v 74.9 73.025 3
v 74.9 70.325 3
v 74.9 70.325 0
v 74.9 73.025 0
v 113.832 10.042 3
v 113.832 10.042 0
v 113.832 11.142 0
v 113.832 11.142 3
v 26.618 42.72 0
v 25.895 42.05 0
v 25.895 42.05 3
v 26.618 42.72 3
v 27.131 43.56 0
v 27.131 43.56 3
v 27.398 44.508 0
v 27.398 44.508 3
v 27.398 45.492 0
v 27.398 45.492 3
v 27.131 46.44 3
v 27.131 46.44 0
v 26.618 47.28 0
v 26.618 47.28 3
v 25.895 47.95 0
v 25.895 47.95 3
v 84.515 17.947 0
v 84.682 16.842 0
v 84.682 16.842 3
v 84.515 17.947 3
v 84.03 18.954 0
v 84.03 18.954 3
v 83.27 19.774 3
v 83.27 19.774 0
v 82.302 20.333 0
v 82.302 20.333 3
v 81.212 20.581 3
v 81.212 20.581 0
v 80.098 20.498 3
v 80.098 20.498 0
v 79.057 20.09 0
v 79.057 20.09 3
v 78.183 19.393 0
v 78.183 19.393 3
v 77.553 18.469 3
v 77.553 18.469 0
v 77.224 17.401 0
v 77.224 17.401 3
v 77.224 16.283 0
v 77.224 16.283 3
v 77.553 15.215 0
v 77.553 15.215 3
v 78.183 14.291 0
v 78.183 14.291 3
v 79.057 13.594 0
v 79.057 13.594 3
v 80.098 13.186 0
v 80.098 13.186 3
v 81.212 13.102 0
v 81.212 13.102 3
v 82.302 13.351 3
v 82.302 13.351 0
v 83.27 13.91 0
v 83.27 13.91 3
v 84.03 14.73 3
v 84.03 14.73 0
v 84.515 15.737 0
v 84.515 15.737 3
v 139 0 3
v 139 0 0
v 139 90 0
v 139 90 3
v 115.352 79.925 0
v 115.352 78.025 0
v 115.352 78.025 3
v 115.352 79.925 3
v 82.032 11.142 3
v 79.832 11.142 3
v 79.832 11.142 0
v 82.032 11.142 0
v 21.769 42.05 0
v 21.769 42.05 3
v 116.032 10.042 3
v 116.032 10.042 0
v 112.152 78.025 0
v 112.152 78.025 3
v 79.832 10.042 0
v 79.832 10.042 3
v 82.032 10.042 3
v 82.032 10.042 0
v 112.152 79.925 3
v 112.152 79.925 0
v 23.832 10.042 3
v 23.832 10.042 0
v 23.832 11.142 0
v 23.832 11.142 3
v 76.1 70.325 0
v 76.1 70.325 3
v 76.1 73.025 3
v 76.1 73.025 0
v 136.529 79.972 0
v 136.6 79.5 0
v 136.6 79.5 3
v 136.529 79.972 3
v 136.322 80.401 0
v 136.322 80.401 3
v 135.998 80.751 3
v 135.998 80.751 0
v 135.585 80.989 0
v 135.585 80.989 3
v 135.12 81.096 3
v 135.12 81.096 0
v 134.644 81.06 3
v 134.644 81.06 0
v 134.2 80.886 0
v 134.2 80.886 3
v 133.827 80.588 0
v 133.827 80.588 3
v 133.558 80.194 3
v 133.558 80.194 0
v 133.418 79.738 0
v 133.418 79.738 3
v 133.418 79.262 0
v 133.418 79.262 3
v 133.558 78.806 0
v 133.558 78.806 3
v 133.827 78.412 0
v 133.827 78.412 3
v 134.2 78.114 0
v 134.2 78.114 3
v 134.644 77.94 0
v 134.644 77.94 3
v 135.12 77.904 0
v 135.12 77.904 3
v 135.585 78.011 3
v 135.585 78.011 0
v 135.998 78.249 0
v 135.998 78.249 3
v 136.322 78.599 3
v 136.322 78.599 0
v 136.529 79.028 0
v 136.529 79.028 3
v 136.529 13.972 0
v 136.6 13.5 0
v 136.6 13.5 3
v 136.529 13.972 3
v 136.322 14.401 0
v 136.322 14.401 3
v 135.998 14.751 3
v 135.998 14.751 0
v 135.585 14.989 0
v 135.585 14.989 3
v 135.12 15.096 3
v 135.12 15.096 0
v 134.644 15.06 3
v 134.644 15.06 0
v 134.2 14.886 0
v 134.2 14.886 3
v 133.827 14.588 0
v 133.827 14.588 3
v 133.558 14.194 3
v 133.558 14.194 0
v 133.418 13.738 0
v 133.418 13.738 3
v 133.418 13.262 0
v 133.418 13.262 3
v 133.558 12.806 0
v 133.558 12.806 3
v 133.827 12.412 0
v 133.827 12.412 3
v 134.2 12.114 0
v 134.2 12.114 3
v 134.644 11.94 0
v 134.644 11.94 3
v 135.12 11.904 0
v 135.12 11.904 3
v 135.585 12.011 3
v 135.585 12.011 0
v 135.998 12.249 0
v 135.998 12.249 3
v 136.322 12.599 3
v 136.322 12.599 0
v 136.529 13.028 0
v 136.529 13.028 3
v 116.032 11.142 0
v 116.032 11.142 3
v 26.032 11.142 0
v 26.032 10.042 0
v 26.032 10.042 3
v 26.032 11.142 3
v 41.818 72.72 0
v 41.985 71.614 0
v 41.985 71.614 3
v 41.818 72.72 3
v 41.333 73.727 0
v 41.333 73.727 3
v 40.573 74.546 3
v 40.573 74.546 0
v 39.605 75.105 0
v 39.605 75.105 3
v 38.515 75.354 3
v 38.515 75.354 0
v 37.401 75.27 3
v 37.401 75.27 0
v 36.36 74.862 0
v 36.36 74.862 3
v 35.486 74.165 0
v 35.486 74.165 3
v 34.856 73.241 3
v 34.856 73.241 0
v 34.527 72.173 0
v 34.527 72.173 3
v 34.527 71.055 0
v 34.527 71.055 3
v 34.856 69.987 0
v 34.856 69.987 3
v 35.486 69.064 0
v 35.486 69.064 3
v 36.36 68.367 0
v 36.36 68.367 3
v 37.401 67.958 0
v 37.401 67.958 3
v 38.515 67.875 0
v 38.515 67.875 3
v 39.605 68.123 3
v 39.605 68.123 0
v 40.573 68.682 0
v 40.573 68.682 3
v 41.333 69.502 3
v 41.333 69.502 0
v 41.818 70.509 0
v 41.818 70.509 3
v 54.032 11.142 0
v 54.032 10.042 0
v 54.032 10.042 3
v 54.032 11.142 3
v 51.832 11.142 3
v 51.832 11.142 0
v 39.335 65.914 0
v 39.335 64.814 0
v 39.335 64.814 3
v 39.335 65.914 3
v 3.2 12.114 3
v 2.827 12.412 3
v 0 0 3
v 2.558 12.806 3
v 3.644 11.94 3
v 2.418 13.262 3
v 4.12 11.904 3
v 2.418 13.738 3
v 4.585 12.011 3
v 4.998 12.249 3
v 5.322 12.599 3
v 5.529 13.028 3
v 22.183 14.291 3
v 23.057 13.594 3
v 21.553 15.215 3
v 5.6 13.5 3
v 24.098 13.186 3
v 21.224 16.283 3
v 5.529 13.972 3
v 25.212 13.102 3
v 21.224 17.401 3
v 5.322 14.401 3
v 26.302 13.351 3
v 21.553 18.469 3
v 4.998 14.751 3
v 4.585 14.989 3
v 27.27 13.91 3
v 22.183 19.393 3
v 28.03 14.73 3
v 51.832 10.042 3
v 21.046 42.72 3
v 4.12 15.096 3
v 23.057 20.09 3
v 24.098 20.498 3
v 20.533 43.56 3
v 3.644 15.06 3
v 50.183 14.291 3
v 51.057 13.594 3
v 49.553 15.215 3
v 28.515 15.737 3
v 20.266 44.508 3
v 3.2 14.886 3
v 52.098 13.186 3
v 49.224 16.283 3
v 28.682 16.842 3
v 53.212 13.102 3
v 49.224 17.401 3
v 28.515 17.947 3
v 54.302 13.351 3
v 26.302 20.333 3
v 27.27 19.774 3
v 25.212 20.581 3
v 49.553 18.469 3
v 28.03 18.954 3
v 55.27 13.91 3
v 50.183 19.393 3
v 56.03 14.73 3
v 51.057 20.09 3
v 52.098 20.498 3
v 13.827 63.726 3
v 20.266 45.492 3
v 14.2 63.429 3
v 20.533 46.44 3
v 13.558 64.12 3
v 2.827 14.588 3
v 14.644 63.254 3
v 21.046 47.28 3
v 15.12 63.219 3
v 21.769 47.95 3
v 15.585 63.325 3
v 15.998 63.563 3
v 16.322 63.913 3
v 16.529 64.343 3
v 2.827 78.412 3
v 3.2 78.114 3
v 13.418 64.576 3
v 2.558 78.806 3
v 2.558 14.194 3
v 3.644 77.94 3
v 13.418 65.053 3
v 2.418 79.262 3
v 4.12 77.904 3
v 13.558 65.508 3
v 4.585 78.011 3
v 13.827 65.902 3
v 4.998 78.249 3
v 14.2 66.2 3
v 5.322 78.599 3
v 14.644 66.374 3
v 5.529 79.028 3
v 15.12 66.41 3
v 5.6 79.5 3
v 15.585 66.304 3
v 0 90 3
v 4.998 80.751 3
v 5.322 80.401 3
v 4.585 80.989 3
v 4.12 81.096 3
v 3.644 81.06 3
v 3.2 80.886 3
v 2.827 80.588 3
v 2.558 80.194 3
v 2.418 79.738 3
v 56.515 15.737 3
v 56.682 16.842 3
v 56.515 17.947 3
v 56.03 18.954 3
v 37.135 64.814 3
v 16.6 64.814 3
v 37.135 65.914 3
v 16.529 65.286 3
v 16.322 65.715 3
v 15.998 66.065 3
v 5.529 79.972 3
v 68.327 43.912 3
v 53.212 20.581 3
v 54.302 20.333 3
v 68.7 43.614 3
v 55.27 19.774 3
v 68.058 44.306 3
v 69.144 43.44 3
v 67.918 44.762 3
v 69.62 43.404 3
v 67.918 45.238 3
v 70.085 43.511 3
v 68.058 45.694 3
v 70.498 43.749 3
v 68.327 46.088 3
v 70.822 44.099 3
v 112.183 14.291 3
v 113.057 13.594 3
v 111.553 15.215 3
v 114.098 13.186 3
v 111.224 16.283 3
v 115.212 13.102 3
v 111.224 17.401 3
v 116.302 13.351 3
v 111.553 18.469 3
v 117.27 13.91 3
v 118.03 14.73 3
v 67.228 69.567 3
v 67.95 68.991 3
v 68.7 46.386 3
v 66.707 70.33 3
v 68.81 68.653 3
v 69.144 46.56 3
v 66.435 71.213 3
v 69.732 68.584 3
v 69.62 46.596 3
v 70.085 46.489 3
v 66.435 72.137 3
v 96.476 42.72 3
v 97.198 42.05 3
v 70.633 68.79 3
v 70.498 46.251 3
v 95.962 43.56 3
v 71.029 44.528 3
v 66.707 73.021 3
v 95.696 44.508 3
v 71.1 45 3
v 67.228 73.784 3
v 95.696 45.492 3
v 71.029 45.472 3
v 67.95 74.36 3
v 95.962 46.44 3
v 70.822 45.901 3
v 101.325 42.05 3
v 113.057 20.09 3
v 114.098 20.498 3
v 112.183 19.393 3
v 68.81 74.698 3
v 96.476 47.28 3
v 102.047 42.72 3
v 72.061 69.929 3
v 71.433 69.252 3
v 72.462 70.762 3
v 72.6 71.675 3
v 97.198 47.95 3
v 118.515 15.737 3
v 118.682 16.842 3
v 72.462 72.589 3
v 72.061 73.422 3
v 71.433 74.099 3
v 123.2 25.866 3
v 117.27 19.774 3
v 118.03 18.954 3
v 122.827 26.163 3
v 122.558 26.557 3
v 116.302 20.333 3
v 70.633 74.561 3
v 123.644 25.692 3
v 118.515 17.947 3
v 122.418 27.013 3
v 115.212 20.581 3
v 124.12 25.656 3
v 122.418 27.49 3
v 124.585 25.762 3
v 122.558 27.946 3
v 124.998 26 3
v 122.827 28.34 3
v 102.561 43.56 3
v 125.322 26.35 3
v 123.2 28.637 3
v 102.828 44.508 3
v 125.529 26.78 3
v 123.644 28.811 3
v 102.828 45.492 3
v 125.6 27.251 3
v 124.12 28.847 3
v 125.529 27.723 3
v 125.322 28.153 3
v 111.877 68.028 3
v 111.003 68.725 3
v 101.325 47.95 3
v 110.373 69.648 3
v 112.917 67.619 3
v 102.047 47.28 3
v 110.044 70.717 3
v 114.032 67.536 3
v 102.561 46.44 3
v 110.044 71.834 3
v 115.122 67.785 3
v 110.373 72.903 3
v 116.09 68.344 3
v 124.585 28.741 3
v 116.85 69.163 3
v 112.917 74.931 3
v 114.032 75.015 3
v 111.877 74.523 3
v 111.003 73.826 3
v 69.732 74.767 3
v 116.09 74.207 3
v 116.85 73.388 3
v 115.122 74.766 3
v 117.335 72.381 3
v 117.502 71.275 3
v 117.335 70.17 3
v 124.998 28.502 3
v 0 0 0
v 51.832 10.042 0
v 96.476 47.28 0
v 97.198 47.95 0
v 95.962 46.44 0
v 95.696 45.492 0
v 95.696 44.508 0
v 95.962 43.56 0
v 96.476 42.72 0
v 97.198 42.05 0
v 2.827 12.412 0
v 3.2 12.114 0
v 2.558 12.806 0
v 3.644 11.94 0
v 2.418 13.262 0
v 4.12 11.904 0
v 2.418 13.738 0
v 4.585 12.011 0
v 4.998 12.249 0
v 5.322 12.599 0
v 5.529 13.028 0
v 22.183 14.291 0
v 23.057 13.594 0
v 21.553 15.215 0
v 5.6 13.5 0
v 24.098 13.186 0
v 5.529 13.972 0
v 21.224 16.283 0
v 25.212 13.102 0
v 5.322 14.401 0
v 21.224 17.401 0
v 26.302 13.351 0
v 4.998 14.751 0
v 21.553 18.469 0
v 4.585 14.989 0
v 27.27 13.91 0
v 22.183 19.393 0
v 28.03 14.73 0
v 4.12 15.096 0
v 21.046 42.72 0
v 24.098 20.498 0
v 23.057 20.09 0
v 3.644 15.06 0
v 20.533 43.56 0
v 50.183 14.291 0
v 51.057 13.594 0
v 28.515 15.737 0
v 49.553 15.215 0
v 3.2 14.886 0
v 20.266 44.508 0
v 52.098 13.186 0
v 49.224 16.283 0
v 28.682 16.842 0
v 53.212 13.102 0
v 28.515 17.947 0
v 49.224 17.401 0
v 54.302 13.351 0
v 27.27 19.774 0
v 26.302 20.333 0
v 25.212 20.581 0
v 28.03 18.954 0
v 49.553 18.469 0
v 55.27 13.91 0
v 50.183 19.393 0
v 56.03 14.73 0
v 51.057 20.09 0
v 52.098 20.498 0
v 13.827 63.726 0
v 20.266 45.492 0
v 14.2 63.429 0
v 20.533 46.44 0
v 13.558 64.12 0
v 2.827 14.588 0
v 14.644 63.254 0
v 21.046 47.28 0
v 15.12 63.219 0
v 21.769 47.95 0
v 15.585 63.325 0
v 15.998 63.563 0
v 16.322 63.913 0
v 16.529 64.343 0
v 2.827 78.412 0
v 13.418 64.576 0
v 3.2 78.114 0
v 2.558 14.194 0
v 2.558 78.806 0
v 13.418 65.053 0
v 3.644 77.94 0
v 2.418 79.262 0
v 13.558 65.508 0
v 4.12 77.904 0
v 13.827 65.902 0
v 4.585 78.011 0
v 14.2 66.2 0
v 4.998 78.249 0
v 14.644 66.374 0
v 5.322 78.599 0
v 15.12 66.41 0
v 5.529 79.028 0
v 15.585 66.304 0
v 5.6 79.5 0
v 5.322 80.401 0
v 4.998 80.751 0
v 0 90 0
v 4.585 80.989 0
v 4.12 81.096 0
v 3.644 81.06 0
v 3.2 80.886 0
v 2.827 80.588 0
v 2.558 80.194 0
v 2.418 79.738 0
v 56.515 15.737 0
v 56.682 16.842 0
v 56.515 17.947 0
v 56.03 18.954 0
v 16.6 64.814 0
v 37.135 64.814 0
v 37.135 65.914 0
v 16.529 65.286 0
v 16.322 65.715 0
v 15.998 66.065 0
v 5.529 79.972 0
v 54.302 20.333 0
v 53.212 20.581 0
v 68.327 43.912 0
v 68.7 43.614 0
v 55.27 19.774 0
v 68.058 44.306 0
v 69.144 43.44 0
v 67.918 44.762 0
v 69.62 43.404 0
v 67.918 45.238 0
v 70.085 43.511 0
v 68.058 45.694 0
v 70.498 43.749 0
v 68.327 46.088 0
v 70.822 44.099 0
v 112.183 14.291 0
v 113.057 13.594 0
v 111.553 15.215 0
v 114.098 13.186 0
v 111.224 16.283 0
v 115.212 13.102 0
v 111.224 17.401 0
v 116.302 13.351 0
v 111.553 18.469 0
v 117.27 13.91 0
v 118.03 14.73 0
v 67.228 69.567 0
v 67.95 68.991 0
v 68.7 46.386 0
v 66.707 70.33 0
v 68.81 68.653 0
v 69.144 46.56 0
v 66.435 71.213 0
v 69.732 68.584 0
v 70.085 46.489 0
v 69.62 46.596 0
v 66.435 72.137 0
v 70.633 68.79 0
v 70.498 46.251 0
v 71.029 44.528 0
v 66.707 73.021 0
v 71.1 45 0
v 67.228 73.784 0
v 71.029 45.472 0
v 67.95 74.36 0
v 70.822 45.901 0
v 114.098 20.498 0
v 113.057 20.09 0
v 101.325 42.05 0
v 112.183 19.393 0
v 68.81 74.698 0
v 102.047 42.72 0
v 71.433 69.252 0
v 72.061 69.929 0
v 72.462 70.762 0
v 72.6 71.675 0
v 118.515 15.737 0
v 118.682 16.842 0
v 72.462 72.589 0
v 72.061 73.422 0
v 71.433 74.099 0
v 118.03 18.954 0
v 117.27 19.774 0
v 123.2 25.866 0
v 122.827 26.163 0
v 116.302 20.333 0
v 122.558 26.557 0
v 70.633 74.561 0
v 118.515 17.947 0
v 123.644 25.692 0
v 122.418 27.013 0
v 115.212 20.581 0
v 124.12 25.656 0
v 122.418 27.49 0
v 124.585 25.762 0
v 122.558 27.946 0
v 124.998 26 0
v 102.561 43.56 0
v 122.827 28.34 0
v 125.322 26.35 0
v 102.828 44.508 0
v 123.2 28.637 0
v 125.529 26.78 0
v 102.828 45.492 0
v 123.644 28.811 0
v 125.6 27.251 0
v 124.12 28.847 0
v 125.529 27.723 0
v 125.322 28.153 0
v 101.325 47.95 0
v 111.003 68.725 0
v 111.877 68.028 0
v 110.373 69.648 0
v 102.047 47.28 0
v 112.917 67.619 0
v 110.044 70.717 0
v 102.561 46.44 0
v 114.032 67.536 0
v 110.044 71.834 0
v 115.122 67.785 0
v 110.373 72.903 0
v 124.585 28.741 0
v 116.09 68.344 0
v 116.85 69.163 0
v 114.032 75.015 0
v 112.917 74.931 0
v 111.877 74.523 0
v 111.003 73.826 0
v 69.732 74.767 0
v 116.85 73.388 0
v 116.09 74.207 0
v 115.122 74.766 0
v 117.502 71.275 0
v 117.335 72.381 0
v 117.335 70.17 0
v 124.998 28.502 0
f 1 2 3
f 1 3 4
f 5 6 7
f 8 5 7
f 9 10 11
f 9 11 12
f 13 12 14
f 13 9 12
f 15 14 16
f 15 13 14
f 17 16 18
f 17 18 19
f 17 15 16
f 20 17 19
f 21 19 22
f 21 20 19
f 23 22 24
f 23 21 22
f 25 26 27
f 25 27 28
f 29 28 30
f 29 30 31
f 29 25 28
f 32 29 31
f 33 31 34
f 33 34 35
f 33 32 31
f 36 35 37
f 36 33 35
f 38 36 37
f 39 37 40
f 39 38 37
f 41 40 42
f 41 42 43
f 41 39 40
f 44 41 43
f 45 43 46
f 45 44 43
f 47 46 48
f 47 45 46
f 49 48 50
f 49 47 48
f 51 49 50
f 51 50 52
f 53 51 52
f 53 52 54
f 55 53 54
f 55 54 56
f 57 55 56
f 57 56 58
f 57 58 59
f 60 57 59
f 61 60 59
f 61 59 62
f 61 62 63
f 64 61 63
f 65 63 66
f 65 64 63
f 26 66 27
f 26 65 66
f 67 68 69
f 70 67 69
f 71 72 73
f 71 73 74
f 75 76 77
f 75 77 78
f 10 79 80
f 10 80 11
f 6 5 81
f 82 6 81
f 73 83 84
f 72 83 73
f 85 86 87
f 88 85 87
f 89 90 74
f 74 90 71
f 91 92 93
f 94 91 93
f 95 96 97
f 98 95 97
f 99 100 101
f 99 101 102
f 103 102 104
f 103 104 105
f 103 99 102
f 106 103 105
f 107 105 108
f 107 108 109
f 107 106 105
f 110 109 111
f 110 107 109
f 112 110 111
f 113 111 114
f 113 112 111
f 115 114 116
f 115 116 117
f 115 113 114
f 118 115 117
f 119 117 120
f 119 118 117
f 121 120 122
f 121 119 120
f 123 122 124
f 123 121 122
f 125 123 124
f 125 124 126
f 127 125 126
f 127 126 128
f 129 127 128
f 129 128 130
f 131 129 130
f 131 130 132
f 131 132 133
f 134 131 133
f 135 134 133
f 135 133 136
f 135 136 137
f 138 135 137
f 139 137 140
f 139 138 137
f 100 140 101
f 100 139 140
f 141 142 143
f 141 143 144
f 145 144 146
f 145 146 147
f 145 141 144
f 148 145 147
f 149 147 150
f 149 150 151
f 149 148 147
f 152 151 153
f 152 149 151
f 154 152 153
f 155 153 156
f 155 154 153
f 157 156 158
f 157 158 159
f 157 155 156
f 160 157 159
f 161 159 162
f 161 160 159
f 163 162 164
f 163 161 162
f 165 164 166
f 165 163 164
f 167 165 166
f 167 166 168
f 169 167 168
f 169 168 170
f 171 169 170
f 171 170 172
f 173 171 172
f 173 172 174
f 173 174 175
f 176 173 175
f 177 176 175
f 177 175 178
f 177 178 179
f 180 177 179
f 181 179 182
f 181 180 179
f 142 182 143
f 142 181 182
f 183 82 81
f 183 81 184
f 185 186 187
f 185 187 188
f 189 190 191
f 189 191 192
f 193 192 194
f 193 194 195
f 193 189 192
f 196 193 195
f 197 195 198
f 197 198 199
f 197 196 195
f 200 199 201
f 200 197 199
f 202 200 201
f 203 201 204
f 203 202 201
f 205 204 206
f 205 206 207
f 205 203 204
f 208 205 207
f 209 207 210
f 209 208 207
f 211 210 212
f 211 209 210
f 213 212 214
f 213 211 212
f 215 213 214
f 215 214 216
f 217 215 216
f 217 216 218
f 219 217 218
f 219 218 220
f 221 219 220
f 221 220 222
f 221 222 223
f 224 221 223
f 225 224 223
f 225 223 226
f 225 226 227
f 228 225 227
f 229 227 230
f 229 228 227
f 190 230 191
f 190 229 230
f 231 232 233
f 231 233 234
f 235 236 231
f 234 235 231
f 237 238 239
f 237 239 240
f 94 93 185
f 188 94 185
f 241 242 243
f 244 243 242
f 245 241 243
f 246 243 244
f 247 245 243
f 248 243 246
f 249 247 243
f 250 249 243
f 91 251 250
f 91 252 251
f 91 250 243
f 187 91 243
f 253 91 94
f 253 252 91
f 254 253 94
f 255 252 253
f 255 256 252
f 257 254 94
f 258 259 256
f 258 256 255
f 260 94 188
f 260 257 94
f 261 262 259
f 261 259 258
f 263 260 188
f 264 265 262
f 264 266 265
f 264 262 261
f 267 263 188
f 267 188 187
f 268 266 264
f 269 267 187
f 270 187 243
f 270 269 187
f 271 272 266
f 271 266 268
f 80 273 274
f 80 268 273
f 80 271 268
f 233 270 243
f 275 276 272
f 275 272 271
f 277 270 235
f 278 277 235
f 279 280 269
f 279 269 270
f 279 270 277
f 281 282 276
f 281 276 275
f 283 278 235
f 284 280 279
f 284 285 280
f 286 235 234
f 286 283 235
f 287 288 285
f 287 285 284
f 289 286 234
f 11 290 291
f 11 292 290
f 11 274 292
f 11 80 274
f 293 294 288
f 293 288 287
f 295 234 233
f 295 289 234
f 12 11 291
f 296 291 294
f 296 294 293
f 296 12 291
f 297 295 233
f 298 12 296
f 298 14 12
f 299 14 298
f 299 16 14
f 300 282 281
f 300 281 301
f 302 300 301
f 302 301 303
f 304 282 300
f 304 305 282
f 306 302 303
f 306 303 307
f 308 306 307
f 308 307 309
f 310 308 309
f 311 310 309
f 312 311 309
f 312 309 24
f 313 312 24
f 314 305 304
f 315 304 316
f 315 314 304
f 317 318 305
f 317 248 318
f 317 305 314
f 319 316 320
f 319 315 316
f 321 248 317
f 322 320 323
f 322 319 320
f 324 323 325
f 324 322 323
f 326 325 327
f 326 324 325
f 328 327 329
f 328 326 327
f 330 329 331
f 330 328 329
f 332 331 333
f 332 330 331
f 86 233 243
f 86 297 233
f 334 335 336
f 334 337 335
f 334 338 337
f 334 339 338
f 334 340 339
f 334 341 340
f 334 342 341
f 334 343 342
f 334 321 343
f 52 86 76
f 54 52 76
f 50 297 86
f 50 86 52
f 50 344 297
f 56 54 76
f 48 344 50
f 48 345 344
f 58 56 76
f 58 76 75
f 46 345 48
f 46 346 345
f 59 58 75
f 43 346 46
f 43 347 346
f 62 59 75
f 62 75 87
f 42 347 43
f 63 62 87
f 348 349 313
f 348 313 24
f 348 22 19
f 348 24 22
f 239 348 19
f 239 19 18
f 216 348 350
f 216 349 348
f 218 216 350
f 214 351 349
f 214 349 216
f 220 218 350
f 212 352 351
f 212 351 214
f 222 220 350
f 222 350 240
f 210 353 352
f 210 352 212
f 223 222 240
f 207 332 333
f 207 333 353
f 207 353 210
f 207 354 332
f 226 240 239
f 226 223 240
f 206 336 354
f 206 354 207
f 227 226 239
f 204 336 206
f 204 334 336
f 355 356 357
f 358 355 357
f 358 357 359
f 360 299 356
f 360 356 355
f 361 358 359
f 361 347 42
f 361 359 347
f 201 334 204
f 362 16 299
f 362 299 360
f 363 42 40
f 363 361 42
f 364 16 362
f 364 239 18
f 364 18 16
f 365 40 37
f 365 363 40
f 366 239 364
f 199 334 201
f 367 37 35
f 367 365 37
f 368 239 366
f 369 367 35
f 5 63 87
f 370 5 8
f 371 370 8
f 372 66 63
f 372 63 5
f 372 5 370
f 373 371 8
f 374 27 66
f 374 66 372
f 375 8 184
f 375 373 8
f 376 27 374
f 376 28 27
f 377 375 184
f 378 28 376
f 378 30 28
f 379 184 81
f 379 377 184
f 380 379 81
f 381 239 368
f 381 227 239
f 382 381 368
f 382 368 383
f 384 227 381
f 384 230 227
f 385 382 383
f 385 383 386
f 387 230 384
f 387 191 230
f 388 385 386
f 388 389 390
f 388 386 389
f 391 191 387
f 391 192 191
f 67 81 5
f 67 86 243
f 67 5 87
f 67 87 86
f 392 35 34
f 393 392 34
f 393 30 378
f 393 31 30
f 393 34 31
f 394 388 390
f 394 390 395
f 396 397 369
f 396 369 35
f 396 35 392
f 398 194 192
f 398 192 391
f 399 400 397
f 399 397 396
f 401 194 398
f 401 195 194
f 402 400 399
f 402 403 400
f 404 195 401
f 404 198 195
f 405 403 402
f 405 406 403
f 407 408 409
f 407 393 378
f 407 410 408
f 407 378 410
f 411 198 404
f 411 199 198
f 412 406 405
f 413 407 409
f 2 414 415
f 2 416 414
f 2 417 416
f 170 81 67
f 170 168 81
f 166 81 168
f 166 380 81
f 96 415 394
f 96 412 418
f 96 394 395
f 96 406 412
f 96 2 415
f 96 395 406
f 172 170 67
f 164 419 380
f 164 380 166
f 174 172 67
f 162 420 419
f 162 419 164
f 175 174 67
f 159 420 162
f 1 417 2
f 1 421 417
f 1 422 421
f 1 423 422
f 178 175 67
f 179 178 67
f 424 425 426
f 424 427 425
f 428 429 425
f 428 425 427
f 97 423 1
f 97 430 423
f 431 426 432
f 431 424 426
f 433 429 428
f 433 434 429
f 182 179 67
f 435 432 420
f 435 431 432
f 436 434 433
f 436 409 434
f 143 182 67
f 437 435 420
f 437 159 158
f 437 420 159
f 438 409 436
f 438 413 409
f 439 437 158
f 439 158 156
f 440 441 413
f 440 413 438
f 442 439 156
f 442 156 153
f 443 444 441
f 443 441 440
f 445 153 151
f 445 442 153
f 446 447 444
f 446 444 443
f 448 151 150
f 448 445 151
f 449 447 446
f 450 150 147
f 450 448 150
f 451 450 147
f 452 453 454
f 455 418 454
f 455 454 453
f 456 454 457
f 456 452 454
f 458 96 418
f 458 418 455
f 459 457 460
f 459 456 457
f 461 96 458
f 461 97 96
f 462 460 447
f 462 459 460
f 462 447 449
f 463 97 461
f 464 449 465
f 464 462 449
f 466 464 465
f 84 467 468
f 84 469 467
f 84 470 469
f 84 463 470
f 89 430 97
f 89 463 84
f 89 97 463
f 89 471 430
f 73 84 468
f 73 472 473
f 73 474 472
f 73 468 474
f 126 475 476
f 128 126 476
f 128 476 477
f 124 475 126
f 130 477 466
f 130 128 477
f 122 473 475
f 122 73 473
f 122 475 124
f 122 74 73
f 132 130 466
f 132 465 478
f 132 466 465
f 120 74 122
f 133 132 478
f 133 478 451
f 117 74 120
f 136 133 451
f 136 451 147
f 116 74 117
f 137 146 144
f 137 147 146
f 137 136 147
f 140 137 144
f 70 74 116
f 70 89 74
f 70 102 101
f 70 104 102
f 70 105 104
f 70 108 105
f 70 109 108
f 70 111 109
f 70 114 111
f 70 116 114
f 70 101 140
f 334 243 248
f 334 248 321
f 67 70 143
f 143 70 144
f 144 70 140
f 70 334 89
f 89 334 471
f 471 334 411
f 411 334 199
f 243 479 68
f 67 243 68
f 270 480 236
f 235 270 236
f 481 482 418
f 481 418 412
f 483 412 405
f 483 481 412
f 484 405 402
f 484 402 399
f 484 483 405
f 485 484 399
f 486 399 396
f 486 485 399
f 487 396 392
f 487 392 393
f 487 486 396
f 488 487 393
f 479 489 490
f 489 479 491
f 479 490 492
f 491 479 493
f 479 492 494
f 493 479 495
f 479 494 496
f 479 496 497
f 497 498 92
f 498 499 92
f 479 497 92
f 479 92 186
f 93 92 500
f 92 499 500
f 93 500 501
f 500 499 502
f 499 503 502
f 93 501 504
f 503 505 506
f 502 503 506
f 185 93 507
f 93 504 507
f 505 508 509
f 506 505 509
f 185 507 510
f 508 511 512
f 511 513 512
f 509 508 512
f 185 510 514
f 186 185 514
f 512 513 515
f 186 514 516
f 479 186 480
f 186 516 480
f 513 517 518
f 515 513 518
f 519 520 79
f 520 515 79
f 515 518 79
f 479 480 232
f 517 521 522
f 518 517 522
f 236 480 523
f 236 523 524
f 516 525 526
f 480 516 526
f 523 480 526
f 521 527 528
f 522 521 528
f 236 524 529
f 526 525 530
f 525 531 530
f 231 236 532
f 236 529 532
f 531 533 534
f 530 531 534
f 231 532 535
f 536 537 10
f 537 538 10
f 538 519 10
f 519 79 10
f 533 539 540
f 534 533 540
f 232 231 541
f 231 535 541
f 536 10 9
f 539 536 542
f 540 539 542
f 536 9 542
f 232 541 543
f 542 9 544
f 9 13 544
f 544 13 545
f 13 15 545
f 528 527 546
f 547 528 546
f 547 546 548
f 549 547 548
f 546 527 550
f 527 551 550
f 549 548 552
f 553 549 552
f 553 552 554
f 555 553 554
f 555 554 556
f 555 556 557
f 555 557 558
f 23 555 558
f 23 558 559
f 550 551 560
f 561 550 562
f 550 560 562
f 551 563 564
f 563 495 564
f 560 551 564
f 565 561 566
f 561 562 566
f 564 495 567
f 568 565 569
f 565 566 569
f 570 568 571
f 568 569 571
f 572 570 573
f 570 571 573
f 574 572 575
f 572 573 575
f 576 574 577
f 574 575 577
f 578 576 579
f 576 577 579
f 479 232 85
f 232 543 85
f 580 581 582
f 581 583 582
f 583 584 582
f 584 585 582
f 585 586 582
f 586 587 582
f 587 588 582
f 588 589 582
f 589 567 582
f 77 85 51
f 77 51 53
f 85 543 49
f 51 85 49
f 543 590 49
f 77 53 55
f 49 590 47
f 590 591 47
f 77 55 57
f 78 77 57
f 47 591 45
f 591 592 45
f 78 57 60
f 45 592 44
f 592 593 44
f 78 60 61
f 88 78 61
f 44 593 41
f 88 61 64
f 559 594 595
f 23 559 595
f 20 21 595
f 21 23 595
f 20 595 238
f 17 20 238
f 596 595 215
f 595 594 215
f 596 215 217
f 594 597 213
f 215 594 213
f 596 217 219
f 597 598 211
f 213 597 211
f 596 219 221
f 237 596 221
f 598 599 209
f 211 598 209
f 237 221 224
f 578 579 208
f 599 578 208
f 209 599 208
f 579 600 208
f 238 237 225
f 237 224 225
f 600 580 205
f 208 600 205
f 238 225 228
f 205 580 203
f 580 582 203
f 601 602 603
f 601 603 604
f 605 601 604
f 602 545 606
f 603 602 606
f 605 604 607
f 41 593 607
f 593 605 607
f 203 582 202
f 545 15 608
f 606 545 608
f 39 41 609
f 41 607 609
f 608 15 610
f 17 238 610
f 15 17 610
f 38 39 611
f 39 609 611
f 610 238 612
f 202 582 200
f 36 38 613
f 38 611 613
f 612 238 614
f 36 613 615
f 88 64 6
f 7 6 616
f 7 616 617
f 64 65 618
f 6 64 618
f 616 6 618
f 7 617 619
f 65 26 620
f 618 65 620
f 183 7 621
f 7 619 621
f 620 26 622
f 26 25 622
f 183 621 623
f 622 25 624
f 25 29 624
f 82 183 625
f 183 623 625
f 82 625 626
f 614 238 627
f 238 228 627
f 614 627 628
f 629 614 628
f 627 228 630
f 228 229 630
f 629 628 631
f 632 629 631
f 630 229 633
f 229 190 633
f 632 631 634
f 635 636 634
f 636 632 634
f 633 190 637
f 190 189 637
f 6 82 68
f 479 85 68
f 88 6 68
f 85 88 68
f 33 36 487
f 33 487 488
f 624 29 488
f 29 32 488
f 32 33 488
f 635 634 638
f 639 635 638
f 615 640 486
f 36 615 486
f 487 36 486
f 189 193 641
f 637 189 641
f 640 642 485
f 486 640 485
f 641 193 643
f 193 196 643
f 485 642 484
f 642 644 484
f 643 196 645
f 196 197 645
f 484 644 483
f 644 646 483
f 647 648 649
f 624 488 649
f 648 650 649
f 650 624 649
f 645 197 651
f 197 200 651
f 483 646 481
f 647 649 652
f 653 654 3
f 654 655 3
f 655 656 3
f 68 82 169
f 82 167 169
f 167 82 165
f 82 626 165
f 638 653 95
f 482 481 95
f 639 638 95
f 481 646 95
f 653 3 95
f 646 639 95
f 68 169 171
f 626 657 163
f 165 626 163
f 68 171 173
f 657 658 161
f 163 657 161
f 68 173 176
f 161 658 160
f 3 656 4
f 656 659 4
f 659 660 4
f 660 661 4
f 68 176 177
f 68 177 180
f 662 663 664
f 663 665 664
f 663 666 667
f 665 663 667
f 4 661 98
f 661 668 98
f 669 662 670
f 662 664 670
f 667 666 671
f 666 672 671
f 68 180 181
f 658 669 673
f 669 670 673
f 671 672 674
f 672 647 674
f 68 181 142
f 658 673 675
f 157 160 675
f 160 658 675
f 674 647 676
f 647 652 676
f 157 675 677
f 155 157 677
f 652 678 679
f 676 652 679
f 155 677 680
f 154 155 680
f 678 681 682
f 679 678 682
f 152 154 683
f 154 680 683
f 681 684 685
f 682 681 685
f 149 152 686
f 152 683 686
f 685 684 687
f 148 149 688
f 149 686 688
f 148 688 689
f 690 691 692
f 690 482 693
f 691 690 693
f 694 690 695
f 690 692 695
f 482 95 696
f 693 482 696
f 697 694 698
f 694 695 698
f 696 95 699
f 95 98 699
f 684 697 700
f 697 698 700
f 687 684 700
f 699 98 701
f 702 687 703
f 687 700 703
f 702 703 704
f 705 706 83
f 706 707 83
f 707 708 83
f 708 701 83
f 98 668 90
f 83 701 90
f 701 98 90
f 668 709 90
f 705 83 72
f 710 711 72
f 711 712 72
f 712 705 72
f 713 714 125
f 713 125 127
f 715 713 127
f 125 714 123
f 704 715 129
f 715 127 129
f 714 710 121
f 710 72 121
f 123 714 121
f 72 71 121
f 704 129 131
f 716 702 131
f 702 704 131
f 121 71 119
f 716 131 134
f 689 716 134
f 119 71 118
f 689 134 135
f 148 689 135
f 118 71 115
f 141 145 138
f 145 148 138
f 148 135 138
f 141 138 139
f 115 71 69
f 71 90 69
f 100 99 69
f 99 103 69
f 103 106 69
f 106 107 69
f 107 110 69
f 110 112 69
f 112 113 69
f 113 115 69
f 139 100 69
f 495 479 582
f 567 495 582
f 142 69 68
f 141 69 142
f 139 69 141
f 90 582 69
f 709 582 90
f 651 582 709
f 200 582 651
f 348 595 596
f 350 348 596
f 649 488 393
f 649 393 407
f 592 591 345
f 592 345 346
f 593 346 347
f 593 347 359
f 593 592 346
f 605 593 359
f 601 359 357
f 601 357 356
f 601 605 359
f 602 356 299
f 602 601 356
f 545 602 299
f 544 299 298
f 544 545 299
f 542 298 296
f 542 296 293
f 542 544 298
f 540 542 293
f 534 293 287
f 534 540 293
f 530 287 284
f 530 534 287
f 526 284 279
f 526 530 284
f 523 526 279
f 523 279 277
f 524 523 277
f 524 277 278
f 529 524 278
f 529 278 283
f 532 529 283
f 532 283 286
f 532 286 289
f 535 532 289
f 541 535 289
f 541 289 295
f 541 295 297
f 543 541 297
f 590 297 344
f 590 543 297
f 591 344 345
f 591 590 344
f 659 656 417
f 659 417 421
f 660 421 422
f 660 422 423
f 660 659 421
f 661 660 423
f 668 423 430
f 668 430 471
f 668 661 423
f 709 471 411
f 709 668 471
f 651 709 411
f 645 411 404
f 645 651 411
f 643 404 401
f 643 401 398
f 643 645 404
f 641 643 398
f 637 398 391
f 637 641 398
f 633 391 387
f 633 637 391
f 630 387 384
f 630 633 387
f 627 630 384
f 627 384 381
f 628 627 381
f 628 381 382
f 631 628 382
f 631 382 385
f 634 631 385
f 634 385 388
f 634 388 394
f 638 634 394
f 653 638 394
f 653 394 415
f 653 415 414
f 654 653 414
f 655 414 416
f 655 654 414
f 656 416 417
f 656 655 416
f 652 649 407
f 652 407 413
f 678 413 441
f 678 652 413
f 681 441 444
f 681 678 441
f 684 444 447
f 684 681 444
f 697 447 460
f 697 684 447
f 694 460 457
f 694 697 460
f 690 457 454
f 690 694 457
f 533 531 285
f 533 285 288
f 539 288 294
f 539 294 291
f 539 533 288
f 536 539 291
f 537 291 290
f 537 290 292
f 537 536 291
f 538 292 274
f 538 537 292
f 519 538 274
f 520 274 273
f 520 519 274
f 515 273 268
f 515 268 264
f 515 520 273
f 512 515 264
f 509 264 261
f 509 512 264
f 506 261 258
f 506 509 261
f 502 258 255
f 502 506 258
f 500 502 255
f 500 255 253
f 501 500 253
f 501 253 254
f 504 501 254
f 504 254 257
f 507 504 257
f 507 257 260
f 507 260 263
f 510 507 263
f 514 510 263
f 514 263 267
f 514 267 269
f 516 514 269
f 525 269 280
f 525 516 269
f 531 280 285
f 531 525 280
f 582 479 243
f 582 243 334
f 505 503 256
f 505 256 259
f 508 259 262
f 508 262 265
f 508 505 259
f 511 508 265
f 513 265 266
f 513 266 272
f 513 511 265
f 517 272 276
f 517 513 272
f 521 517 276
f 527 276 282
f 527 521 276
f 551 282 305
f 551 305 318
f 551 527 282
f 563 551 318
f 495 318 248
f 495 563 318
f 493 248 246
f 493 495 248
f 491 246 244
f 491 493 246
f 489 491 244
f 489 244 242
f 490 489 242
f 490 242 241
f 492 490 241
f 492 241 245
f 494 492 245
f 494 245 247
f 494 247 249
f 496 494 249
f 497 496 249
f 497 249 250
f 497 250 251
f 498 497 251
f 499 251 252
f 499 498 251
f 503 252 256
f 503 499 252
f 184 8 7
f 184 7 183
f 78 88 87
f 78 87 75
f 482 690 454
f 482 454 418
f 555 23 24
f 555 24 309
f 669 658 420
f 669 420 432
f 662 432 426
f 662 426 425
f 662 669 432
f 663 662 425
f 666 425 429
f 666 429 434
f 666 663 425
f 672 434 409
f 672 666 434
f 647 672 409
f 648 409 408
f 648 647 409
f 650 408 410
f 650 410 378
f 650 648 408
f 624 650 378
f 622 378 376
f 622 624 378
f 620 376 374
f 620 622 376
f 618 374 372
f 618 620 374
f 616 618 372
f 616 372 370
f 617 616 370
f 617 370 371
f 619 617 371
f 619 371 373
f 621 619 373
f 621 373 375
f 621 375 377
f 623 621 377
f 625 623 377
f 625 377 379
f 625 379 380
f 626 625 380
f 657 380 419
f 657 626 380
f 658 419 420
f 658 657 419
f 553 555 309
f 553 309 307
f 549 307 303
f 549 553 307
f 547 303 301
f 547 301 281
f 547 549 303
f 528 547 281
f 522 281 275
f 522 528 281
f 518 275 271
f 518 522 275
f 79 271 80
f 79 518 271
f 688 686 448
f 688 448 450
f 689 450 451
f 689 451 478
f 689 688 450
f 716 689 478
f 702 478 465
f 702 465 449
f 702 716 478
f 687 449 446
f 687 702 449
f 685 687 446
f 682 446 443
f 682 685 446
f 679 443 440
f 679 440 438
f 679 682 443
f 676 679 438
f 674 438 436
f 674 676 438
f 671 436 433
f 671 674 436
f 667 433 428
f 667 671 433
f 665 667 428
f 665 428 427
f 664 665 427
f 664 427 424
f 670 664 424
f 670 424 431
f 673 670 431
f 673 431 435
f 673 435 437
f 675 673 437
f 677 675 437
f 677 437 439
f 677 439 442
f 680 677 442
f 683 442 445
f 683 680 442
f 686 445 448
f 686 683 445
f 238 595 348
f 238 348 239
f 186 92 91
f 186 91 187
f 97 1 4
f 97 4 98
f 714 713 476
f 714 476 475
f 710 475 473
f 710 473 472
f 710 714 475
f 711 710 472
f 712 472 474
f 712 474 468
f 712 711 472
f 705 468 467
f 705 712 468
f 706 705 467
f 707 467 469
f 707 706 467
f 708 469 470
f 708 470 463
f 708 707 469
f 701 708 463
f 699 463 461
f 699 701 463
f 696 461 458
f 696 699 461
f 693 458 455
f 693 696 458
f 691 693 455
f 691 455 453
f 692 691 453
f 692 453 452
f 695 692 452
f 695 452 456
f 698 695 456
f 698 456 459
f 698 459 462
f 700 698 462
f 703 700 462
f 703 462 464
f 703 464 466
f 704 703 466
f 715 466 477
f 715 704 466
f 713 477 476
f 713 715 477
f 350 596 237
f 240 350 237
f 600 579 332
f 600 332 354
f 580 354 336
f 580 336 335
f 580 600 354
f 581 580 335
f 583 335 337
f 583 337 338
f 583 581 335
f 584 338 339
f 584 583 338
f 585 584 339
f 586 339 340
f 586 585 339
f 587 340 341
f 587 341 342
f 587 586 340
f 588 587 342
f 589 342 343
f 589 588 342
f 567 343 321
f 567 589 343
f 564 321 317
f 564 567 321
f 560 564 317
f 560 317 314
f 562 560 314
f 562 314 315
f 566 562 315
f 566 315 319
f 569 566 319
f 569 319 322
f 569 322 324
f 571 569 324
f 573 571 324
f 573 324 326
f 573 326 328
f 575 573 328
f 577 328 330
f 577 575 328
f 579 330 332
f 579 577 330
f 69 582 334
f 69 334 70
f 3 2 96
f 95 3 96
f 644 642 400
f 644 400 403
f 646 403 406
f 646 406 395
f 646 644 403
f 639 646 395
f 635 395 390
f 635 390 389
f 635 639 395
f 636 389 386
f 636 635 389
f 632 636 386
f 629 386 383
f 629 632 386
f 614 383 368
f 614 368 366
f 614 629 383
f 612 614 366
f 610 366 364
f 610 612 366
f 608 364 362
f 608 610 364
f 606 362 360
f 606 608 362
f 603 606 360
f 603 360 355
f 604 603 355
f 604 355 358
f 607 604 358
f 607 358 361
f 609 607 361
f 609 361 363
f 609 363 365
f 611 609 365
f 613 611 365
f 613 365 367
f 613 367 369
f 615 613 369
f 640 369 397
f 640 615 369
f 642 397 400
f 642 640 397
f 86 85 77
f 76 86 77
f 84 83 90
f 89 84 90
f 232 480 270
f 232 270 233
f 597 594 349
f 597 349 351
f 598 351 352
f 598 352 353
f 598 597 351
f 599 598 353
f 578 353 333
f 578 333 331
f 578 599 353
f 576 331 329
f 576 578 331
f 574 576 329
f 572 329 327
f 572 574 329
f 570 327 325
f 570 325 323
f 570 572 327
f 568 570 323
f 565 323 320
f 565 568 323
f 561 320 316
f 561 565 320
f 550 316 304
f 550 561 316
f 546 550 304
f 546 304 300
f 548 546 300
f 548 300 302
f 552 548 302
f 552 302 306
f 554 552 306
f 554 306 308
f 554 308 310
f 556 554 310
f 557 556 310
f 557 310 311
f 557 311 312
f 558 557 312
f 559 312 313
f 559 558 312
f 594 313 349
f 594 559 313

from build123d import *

# Parameters (mm, degrees)
SKETCH1_W           = 139
SKETCH1_H           = 90
SKETCH1_R           = 1.6
SKETCH1_R_2         = 3.75
SKETCH1_R_3         = 3.1
SKETCH1_W_2         = 2.2
SKETCH1_H_2         = 1.1
SKETCH1_W_3         = 1.2
SKETCH1_H_3         = 2.7
SKETCH1_W_4         = 3.2
SKETCH1_H_4         = 1.9
BOSS_EXTRUDE1_DEPTH = 3


with BuildPart() as part:
    # Sketch1 → Boss-Extrude1 (new body)
    with BuildSketch(Plane.XY):
        with Locations((69.5, 45)):
            Rectangle(SKETCH1_W, SKETCH1_H)
        with Locations((4, 79.5)):
            Circle(SKETCH1_R, mode=Mode.SUBTRACT)
        with Locations((135, 79.5)):
            Circle(SKETCH1_R, mode=Mode.SUBTRACT)
        with Locations((135, 13.5)):
            Circle(SKETCH1_R, mode=Mode.SUBTRACT)
        with Locations((4, 13.5)):
            Circle(SKETCH1_R, mode=Mode.SUBTRACT)
        with Locations((15, 64.814177958)):
            Circle(SKETCH1_R, mode=Mode.SUBTRACT)
        with Locations((38.235051241, 71.614177958)):
            Circle(SKETCH1_R_2, mode=Mode.SUBTRACT)
        with Locations((124, 27.251424775)):
            Circle(SKETCH1_R, mode=Mode.SUBTRACT)
        with Locations((24.931997534, 16.841976033)):
            Circle(SKETCH1_R_2, mode=Mode.SUBTRACT)
        with Locations((52.931997534, 16.841976033)):
            Circle(SKETCH1_R_2, mode=Mode.SUBTRACT)
        with Locations((80.931997534, 16.841976033)):
            Circle(SKETCH1_R_2, mode=Mode.SUBTRACT)
        with Locations((114.931997534, 16.841976033)):
            Circle(SKETCH1_R_2, mode=Mode.SUBTRACT)
        with Locations((69.5, 71.675460618)):
            Circle(SKETCH1_R_3, mode=Mode.SUBTRACT)
        with Locations((113.751643049, 71.275460618)):
            Circle(SKETCH1_R_2, mode=Mode.SUBTRACT)
        with Locations((69.5, 45)):
            Circle(SKETCH1_R, mode=Mode.SUBTRACT)
        with Locations((38.235051241, 65.364177958)):
            Rectangle(SKETCH1_W_2, SKETCH1_H_2, mode=Mode.SUBTRACT)
        with Locations((24.931997534, 10.591976033)):
            Rectangle(SKETCH1_W_2, SKETCH1_H_2, mode=Mode.SUBTRACT)
        with Locations((52.931997534, 10.591976033)):
            Rectangle(SKETCH1_W_2, SKETCH1_H_2, mode=Mode.SUBTRACT)
        with Locations((80.931997534, 10.591976033)):
            Rectangle(SKETCH1_W_2, SKETCH1_H_2, mode=Mode.SUBTRACT)
        with Locations((114.931997534, 10.591976033)):
            Rectangle(SKETCH1_W_2, SKETCH1_H_2, mode=Mode.SUBTRACT)
        with BuildLine():
            Line((97.198408737, 42.05), (101.325150794, 42.05))
            ThreePointArc((101.325150794, 42.05), (102.861779766, 45), (101.325150794, 47.95))
            Line((101.325150794, 47.95), (97.198408737, 47.95))
            ThreePointArc((97.198408737, 47.95), (95.661779766, 45), (97.198408737, 42.05))
        make_face(mode=Mode.SUBTRACT)
        with Locations((75.5, 71.675460618)):
            Rectangle(SKETCH1_W_3, SKETCH1_H_3, mode=Mode.SUBTRACT)
        with Locations((113.751643049, 78.975460618)):
            Rectangle(SKETCH1_W_4, SKETCH1_H_4, mode=Mode.SUBTRACT)
        with BuildLine():
            Line((21.768626506, 42.05), (25.895368563, 42.05))
            ThreePointArc((25.895368563, 42.05), (27.431997534, 45), (25.895368563, 47.95))
            Line((25.895368563, 47.95), (21.768626506, 47.95))
            ThreePointArc((21.768626506, 47.95), (20.231997534, 45), (21.768626506, 42.05))
        make_face(mode=Mode.SUBTRACT)
    extrude(amount=BOSS_EXTRUDE1_DEPTH)


solid = part.part
